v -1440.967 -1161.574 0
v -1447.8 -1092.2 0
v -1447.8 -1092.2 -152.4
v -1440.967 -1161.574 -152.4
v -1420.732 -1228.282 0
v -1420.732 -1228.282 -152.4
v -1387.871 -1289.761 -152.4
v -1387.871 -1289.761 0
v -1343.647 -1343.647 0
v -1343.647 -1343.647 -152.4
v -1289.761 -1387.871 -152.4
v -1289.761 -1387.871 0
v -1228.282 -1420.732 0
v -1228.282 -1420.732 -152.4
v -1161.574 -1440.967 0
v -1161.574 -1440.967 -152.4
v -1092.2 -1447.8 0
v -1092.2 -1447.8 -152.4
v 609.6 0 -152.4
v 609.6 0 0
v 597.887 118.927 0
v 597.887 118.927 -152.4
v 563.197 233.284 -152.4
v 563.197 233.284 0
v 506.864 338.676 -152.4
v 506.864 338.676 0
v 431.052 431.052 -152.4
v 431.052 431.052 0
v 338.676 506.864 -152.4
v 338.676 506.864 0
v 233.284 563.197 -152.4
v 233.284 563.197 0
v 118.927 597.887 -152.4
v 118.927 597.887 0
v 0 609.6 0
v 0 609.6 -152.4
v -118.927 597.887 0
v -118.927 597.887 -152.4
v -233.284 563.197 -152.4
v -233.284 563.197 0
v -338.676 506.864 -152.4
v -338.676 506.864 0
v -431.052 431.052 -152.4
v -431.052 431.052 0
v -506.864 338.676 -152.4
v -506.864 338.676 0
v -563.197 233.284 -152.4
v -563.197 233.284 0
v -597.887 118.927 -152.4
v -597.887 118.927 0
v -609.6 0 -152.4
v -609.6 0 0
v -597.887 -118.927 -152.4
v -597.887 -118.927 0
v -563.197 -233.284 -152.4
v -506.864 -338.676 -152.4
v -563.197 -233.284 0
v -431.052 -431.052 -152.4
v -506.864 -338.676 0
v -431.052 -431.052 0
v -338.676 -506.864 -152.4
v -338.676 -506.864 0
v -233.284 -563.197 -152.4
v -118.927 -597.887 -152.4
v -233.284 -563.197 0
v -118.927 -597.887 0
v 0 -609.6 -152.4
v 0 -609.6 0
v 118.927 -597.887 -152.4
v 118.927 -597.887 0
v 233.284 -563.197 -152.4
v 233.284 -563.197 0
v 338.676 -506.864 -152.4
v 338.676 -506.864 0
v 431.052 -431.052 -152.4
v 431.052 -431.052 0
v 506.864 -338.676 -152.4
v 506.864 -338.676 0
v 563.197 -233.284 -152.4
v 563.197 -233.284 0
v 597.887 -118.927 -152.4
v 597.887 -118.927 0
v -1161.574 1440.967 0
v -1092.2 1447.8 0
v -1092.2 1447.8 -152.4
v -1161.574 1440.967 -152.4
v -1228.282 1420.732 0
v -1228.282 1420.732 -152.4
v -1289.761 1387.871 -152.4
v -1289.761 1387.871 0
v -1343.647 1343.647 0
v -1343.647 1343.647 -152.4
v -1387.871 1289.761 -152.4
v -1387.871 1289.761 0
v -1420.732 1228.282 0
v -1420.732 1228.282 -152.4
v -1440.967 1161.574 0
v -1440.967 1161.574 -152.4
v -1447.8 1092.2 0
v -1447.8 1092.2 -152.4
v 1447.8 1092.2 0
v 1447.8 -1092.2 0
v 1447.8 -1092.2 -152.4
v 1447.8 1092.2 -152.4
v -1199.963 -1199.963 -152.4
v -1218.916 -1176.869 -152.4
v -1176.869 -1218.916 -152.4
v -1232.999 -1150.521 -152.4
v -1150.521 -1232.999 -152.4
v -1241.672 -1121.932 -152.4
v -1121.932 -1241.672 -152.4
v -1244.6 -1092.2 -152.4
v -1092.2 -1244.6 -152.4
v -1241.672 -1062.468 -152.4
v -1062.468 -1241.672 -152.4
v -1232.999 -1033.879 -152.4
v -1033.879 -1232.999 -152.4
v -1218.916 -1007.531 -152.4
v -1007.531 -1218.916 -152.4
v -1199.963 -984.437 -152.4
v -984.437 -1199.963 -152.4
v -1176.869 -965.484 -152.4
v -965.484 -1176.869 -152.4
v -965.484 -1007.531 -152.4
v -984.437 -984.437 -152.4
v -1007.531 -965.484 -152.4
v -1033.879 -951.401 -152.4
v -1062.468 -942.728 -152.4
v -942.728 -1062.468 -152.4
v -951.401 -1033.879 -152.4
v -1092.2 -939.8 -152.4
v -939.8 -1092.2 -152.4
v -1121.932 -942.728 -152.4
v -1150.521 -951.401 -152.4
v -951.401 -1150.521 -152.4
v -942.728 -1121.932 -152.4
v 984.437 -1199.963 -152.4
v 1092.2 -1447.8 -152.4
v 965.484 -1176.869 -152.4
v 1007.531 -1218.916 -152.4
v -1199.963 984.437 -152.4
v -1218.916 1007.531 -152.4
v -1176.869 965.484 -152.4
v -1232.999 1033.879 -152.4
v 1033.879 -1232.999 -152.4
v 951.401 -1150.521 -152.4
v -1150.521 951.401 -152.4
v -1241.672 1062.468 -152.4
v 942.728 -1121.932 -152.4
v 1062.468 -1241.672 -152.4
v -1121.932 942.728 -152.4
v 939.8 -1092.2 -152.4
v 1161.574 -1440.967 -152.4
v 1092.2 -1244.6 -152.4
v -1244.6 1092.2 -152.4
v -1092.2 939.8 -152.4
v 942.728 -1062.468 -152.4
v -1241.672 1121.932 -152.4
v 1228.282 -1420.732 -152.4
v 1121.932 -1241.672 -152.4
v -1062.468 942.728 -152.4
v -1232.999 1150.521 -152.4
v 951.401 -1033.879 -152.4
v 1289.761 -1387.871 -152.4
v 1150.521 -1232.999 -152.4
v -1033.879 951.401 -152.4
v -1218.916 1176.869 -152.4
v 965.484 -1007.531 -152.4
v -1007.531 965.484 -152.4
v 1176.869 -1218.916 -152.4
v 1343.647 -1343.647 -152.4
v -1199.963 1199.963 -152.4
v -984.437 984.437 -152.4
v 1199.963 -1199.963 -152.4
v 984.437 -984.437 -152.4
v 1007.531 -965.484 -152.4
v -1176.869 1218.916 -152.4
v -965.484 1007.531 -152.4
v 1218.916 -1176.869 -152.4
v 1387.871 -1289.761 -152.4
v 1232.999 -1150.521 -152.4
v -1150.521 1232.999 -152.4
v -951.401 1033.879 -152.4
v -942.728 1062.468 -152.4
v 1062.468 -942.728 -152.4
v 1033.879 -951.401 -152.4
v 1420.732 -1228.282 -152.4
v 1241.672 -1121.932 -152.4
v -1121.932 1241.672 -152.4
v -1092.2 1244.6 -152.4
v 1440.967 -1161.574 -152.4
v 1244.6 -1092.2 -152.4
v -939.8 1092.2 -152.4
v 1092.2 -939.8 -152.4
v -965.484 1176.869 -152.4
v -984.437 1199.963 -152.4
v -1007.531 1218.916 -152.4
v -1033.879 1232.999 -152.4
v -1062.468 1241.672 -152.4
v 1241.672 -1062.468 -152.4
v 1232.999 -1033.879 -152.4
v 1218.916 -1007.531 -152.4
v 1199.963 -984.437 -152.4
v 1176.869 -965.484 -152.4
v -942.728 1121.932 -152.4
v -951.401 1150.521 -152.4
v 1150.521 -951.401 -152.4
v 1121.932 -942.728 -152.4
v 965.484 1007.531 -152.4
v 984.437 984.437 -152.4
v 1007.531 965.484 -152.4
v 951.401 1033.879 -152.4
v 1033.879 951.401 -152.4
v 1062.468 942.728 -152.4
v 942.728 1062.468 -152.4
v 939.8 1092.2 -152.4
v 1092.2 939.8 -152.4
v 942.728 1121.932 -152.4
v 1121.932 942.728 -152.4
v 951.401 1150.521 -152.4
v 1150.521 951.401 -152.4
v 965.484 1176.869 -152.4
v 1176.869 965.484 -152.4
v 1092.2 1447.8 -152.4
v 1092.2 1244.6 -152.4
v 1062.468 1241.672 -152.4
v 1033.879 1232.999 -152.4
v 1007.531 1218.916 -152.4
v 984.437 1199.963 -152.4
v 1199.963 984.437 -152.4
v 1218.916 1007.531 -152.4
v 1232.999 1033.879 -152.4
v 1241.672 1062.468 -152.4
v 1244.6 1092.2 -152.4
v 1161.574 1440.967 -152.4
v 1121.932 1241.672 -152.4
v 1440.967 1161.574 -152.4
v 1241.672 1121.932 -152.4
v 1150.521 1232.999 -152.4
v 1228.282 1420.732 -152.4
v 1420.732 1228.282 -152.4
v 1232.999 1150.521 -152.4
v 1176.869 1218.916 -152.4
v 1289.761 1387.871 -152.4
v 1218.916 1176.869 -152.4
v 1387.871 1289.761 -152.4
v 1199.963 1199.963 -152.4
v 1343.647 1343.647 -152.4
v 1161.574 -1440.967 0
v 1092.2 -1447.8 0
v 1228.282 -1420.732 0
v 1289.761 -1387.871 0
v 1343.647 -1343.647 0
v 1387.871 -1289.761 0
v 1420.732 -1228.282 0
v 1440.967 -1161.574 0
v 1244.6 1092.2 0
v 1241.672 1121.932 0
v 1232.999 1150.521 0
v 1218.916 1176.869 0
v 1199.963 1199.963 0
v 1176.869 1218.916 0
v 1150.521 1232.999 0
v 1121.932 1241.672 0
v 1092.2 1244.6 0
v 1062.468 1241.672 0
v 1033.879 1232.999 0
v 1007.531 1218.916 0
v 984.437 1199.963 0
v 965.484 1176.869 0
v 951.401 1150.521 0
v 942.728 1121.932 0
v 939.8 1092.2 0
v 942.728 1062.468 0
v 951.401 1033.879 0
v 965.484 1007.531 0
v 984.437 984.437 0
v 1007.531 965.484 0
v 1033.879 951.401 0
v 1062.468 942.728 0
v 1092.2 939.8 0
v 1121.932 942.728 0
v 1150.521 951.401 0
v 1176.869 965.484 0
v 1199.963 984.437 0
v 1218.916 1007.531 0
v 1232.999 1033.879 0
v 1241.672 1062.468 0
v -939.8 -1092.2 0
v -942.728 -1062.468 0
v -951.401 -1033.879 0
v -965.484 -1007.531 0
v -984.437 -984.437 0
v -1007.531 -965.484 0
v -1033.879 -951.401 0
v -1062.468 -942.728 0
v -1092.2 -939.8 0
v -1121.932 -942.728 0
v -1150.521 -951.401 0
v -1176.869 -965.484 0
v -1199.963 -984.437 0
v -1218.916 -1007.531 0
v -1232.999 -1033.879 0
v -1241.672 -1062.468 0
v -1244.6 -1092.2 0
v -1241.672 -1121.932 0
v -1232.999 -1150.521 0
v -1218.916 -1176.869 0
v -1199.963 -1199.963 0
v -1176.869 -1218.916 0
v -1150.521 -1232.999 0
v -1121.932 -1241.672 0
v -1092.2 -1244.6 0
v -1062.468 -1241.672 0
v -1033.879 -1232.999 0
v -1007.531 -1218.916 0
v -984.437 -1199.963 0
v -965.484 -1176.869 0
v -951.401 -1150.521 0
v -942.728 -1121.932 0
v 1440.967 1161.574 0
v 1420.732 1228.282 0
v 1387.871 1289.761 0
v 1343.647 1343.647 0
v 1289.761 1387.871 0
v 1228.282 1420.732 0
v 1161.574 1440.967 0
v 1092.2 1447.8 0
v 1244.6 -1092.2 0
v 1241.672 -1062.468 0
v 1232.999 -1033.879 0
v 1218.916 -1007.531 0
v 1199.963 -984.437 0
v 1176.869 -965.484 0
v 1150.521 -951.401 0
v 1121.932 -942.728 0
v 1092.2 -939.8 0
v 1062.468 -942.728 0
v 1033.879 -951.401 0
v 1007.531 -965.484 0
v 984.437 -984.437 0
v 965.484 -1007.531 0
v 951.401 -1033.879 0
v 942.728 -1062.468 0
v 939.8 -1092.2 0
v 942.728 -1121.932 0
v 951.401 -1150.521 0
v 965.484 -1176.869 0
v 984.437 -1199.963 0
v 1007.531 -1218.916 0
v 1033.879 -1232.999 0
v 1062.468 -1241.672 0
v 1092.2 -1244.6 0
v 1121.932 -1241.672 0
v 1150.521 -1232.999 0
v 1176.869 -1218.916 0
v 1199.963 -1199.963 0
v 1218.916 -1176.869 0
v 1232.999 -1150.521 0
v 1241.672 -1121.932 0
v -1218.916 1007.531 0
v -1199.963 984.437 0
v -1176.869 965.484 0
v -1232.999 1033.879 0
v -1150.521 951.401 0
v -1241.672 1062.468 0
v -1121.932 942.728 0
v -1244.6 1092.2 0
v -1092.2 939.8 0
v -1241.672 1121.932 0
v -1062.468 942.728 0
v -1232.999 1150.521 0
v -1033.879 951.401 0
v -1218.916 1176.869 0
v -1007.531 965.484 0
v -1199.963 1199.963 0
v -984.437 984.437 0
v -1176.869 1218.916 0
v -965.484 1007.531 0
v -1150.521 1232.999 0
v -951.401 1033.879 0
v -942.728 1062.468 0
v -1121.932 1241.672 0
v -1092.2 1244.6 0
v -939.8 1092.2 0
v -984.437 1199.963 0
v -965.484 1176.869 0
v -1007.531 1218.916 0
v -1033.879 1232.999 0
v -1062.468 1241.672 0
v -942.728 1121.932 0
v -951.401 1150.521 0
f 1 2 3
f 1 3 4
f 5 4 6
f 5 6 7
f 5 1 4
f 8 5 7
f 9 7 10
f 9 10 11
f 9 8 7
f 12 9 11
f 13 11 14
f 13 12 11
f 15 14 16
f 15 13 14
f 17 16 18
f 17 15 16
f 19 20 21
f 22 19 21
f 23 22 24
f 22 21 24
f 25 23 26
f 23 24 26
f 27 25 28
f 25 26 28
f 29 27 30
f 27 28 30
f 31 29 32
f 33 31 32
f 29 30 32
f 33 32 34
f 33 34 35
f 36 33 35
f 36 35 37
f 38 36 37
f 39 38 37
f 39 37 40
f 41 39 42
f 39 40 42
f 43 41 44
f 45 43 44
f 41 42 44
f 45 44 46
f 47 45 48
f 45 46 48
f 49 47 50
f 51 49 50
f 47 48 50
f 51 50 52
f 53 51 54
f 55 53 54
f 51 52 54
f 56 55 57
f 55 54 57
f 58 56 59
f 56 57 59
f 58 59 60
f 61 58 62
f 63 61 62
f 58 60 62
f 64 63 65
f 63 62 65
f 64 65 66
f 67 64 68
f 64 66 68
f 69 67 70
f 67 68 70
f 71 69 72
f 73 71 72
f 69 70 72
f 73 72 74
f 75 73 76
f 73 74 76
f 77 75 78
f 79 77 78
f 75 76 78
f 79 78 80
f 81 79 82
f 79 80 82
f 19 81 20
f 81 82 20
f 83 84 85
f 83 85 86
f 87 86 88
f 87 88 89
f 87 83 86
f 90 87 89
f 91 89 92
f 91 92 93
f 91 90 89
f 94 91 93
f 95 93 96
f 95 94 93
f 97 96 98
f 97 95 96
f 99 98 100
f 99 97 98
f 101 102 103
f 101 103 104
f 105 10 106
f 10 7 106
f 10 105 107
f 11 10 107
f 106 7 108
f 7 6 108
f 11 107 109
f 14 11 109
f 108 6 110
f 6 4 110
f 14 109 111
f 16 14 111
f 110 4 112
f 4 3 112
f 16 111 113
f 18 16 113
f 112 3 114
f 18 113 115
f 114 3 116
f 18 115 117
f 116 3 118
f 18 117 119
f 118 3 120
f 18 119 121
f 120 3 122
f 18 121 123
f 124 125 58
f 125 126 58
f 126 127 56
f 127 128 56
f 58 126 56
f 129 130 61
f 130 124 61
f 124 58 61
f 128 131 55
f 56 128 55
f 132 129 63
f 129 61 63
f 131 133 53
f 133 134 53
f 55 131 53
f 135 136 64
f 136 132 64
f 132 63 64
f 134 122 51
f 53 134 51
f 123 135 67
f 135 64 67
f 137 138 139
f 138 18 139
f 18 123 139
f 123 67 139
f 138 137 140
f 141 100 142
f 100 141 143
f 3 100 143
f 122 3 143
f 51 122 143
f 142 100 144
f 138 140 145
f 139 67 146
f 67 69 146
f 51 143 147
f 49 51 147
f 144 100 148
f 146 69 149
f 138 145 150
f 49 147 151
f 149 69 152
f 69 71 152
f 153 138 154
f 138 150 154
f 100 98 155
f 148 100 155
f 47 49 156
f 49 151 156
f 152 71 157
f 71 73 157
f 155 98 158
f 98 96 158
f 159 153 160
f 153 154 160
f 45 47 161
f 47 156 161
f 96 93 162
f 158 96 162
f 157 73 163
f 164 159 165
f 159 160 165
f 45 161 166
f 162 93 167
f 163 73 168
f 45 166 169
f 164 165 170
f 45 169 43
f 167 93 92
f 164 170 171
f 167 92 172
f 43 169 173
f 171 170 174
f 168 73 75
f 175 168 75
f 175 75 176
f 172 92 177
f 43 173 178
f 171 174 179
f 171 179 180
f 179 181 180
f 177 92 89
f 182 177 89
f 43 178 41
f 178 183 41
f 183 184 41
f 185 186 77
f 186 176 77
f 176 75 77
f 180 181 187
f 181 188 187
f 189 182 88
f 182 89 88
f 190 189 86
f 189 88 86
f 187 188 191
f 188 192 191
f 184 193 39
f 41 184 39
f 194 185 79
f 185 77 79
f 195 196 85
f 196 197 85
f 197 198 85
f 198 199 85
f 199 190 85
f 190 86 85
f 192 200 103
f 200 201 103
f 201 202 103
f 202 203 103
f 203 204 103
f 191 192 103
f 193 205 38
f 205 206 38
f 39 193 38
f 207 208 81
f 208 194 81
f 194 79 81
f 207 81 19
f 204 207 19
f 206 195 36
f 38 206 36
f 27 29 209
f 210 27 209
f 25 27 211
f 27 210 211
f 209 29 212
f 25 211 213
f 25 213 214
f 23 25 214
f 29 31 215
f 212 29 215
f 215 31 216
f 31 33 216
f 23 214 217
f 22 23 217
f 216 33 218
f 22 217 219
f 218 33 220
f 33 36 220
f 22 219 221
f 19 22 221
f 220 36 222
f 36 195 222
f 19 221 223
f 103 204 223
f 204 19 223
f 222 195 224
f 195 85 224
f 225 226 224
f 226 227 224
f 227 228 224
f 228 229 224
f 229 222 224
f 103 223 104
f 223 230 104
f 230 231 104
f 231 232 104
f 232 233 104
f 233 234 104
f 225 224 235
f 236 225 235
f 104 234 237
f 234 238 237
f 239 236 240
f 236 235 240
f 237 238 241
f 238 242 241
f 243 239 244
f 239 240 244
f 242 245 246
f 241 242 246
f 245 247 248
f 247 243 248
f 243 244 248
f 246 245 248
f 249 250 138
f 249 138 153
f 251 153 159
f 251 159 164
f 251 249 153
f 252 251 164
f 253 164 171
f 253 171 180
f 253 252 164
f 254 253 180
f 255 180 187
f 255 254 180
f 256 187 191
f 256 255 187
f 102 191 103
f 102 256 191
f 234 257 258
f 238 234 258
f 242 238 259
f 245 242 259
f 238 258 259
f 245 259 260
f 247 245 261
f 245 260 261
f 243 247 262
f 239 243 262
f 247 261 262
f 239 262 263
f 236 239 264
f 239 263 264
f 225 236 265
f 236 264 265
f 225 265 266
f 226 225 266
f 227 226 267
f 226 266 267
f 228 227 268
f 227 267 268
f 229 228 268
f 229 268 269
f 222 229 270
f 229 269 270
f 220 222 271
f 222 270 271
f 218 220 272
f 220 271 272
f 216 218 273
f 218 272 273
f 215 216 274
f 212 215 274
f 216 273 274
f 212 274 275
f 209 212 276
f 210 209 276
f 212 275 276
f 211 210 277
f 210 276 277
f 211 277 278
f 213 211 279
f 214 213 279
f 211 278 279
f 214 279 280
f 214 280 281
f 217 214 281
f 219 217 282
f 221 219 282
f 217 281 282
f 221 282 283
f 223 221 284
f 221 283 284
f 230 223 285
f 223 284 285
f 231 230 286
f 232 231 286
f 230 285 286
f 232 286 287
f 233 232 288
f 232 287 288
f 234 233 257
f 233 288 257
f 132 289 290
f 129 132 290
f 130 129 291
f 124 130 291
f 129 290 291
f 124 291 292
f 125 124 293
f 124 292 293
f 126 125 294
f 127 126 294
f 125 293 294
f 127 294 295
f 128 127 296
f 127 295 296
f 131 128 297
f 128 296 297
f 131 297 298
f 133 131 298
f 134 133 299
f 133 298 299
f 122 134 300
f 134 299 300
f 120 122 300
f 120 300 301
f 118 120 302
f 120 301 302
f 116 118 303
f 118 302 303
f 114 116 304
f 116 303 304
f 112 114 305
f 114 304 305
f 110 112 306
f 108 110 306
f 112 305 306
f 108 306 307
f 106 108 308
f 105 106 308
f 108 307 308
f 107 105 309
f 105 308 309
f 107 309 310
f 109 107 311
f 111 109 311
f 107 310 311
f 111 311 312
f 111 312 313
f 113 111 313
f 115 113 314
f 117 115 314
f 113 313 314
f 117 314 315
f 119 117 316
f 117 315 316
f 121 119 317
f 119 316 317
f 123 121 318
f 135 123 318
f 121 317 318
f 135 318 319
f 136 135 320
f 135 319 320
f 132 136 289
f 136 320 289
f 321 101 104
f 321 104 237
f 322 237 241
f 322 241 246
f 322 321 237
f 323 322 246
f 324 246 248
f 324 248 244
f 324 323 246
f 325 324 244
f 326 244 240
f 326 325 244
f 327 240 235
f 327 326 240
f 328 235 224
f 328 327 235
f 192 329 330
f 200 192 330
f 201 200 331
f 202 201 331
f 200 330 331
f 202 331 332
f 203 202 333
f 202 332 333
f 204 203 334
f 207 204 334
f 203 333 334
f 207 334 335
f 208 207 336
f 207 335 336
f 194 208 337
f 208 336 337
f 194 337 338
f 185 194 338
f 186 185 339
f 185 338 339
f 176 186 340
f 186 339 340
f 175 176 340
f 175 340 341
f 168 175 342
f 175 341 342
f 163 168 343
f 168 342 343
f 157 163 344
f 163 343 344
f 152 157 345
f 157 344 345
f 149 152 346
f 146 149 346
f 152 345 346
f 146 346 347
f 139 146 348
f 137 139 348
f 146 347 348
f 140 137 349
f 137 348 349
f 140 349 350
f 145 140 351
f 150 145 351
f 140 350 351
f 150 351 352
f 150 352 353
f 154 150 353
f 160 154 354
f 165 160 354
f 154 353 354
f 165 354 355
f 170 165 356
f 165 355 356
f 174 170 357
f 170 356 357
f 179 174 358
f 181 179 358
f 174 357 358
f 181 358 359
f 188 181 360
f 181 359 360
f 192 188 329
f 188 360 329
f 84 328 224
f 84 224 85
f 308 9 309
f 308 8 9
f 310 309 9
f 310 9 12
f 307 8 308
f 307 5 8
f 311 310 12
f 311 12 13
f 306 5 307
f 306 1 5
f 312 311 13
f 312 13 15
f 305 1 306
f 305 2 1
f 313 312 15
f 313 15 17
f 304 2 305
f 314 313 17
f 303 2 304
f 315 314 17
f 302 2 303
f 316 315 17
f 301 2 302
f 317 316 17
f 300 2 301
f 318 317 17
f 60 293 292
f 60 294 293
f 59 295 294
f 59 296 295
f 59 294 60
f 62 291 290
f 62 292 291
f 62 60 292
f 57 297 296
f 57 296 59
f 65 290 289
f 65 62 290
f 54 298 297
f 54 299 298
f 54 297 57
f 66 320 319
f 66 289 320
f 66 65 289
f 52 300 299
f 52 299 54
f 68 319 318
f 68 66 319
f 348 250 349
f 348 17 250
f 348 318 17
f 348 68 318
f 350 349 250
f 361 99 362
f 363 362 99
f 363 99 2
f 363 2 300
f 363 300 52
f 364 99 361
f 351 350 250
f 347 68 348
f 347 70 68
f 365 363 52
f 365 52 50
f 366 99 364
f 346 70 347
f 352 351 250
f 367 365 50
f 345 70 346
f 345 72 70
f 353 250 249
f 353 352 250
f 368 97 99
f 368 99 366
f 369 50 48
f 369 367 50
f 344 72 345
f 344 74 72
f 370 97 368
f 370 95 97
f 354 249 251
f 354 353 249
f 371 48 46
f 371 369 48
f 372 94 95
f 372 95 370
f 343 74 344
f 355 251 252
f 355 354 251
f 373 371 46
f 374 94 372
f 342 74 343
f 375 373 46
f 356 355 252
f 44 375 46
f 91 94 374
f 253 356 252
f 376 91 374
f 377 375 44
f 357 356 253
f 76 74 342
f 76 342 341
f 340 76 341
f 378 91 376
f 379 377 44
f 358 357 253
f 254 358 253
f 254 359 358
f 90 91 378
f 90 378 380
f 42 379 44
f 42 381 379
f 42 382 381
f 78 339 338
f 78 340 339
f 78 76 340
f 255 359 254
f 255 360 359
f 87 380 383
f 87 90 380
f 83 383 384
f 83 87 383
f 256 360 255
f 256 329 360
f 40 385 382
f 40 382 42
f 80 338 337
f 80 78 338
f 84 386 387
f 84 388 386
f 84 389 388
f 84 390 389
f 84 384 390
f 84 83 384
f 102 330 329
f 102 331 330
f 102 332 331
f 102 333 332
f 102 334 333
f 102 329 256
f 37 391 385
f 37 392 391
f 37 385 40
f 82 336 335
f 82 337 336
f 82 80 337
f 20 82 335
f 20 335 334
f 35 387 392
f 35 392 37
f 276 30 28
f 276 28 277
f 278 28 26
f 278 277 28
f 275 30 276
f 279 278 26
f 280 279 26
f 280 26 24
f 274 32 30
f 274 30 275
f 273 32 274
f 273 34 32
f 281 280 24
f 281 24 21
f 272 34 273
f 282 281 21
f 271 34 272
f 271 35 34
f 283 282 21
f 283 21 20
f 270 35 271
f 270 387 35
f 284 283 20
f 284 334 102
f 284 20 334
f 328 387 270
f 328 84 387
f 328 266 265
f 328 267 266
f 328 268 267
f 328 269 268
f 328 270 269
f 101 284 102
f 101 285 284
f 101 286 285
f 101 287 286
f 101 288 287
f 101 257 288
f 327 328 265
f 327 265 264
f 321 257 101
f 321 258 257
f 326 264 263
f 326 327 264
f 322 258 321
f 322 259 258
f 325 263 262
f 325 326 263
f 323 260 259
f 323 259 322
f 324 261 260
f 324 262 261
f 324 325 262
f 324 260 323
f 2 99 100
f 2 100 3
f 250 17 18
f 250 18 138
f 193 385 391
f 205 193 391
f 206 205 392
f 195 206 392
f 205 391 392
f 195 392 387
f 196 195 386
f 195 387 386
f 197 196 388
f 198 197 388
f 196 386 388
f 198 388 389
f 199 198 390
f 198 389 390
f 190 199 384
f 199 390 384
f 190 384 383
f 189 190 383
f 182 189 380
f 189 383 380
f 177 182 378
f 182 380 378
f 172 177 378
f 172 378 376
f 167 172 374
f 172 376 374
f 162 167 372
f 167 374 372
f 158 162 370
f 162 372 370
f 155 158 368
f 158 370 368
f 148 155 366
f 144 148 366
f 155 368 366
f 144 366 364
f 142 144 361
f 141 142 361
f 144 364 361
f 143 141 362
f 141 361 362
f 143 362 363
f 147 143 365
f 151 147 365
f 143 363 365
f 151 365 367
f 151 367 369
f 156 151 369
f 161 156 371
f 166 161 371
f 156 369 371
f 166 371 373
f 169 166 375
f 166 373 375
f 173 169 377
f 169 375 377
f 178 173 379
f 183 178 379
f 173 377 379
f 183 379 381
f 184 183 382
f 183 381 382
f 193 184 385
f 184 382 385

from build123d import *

# Parameters (mm, degrees)
F0_R     = 152.4
F0_R_2   = 609.6
F1_DEPTH = 152.4


with BuildPart() as f1:
    # F0 (on Top) → F1 (new body)
    with BuildSketch(Plane.XY):
        with BuildLine():
            Line((-1092.2, -1447.8), (1092.2, -1447.8))
            ThreePointArc((1092.2, -1447.8), (1343.647171, -1343.647171), (1447.8, -1092.2))
            Line((1447.8, -1092.2), (1447.8, 1092.2))
            ThreePointArc((1447.8, 1092.2), (1343.647171, 1343.647171), (1092.2, 1447.8))
            Line((1092.2, 1447.8), (-1092.2, 1447.8))
            ThreePointArc((-1092.2, 1447.8), (-1343.647171, 1343.647171), (-1447.8, 1092.2))
            Line((-1447.8, 1092.2), (-1447.8, -1092.2))
            ThreePointArc((-1447.8, -1092.2), (-1343.647171, -1343.647171), (-1092.2, -1447.8))
        make_face()
        with Locations((-1092.2, -1092.2)):
            Circle(F0_R, mode=Mode.SUBTRACT)
        with Locations((1092.2, -1092.2)):
            Circle(F0_R, mode=Mode.SUBTRACT)
        with Locations((-1092.2, 1092.2)):
            Circle(F0_R, mode=Mode.SUBTRACT)
        Circle(F0_R_2, mode=Mode.SUBTRACT)
        with Locations((1092.2, 1092.2)):
            Circle(F0_R, mode=Mode.SUBTRACT)
    extrude(amount=-F1_DEPTH)


solid = f1.part
